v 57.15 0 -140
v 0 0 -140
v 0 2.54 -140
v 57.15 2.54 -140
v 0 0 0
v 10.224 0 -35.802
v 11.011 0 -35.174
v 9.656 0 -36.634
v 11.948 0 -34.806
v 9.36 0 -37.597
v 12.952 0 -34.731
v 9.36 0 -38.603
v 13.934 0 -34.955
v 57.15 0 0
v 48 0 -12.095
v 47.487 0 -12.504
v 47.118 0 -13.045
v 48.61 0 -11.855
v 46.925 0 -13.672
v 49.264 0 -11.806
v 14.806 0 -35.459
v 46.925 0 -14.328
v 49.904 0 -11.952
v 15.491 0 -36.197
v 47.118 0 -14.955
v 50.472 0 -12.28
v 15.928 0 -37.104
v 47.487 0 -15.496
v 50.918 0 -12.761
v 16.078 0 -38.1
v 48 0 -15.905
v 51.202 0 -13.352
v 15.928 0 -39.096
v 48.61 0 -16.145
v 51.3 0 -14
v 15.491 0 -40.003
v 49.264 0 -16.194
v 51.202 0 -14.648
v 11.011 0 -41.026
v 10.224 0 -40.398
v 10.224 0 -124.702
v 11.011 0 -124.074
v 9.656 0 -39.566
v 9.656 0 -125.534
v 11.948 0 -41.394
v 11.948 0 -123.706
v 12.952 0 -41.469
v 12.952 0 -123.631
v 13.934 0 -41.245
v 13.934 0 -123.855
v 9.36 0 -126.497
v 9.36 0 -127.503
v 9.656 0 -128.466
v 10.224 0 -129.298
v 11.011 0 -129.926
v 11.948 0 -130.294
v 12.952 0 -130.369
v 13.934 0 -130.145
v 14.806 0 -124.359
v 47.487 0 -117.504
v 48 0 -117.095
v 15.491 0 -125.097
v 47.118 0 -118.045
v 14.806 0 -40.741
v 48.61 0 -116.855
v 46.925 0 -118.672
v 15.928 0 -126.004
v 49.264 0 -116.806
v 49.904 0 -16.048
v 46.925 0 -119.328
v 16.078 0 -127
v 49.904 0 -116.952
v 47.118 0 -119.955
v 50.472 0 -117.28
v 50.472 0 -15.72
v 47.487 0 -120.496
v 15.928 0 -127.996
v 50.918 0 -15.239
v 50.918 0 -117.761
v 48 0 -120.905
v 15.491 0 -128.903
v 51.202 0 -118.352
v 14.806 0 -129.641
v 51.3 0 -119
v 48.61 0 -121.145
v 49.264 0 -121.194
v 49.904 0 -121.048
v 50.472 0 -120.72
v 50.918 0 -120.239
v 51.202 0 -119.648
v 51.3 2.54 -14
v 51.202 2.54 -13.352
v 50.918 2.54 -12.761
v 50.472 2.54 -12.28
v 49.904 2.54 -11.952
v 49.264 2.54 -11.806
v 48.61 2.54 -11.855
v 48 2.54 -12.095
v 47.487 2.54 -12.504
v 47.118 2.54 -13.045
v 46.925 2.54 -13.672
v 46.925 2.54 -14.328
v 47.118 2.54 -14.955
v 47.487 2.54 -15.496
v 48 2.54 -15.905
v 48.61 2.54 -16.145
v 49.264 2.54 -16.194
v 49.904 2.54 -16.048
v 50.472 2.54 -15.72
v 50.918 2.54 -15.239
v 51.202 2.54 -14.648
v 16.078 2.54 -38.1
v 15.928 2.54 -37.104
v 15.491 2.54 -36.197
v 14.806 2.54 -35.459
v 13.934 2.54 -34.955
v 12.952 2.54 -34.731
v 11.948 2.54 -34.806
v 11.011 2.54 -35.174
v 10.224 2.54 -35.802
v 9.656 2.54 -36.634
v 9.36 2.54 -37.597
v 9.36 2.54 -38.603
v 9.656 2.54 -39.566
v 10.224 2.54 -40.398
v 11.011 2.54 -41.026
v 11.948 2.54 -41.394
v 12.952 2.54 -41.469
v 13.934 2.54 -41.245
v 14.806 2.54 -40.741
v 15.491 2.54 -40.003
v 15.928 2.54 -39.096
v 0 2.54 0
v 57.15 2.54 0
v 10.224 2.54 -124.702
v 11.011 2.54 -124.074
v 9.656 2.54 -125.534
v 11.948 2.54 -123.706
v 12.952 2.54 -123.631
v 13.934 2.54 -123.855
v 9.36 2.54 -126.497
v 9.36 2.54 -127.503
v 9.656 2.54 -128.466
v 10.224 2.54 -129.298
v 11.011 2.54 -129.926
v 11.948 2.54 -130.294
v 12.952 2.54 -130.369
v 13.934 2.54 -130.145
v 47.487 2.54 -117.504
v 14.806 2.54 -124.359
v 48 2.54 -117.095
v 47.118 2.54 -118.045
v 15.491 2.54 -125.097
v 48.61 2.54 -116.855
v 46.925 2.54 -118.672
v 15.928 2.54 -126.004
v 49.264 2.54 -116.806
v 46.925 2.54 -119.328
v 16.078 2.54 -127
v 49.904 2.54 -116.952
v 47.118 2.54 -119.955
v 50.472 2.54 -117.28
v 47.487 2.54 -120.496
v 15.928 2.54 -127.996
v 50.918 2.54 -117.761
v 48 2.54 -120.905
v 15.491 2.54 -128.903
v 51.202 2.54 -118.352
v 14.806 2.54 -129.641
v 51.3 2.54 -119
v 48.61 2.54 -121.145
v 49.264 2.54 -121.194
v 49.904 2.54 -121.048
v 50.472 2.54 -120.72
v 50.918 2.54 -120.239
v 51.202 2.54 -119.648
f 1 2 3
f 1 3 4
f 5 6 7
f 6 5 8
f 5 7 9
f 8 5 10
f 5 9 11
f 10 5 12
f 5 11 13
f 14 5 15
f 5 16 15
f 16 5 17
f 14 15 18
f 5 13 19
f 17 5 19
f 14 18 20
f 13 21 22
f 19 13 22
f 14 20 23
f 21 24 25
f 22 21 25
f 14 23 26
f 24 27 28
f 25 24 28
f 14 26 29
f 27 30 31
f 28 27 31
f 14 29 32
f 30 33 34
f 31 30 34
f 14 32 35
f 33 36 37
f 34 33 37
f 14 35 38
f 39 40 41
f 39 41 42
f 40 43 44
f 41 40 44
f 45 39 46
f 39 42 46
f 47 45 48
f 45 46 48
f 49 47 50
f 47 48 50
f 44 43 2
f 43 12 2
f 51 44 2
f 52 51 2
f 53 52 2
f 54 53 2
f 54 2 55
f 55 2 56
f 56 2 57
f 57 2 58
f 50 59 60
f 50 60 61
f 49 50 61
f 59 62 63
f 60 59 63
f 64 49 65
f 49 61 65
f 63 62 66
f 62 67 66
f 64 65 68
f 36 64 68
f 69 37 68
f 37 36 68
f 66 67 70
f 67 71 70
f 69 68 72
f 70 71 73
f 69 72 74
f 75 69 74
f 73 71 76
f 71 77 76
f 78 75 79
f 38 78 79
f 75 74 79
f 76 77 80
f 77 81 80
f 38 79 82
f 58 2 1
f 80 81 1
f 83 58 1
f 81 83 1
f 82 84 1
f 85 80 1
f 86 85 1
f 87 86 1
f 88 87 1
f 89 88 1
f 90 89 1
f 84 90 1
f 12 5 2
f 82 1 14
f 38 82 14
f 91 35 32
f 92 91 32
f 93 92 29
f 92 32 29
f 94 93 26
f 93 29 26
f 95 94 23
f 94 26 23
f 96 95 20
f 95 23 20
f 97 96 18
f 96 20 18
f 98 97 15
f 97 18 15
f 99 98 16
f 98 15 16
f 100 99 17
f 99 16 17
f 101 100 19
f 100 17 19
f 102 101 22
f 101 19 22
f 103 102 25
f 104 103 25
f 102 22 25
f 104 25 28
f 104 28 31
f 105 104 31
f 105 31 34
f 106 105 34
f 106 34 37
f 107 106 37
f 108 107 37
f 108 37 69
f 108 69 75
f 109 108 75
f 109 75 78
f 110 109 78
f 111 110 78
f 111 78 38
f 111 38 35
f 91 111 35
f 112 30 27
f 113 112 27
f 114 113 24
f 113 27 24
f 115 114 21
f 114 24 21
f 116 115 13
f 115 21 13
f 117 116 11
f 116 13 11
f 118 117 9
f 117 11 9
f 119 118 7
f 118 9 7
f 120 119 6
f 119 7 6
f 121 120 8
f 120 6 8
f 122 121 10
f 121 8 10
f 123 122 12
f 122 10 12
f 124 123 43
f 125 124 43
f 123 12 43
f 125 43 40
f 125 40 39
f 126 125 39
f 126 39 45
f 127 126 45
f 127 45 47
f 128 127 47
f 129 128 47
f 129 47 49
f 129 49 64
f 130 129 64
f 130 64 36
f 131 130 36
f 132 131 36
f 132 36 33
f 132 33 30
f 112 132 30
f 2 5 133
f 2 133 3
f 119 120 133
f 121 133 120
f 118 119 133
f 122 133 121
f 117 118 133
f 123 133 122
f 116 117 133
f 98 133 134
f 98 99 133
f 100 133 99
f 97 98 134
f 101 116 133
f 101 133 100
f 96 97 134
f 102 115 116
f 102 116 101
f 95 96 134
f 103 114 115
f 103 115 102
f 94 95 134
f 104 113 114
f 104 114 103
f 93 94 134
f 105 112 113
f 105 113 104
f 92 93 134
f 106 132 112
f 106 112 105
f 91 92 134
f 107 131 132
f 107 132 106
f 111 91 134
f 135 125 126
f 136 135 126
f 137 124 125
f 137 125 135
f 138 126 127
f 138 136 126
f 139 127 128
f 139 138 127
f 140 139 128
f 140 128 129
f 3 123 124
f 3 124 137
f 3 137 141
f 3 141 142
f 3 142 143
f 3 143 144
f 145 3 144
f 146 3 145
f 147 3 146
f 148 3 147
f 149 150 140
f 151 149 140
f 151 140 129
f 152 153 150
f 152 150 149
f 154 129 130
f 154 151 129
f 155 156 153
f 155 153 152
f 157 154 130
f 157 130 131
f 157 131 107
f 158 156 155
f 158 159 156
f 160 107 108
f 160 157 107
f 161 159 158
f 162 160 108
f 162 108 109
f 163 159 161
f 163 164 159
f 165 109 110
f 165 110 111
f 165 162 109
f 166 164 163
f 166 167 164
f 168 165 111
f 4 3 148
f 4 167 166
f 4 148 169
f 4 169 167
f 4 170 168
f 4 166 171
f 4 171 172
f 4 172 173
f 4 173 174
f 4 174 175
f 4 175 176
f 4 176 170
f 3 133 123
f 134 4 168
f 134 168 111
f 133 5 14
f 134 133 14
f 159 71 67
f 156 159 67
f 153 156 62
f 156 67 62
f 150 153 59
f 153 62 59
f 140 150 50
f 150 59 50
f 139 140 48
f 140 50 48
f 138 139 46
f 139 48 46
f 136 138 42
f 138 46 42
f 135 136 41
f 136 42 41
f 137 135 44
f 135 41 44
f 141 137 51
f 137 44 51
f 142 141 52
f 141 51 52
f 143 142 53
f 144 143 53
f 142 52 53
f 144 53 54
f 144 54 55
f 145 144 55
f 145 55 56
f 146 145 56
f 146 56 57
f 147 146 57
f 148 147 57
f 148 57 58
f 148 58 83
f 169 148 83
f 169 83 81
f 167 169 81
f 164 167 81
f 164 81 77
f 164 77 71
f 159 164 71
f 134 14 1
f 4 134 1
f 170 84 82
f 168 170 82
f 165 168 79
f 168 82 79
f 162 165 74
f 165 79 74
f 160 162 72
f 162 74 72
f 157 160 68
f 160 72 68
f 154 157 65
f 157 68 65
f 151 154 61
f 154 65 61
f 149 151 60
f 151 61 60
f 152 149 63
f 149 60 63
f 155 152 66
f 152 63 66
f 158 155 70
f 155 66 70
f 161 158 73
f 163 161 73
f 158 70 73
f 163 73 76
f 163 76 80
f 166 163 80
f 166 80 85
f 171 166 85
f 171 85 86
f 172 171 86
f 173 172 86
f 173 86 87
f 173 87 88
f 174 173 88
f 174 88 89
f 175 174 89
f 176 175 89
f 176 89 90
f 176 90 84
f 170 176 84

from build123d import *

# Parameters (mm, degrees)
SKETCH1_W               = 57.15
SKETCH1_H               = 140
BOSS_EXTRUDE1_DEPTH     = 2.54
SKETCH2_R               = 2.2
CUT_EXTRUDE1_DEPTH      = 3.54
SKETCH3_R               = 3.3782
CUT_EXTRUDE2_DEPTH      = 1
CUT_EXTRUDE2_DEPTH_BACK = 3.54


with BuildPart() as part:
    # Sketch1 → Boss-Extrude1 (new body)
    with BuildSketch(Plane(origin=(0, 0, 0), x_dir=(1, 0, 0), z_dir=(0, 1, 0))):
        with Locations((28.575, 70)):
            Rectangle(SKETCH1_W, SKETCH1_H)
    extrude(amount=BOSS_EXTRUDE1_DEPTH)

    # Sketch2 → Cut-Extrude1 (cut, through all)
    with BuildSketch(Plane.XZ):
        with Locations((49.1, -119)):
            Circle(SKETCH2_R)
        with Locations((49.1, -14)):
            Circle(SKETCH2_R)
    extrude(amount=-CUT_EXTRUDE1_DEPTH, mode=Mode.SUBTRACT)

    # Sketch3 → Cut-Extrude2 (cut, two sides)
    with BuildSketch(Plane.XZ) as cut_extrude2_sk:
        with Locations((12.7, -127)):
            Circle(SKETCH3_R)
        with Locations((12.7, -38.1)):
            Circle(SKETCH3_R)
    extrude(amount=CUT_EXTRUDE2_DEPTH, mode=Mode.SUBTRACT)
    extrude(cut_extrude2_sk.sketch, amount=-CUT_EXTRUDE2_DEPTH_BACK, mode=Mode.SUBTRACT)


solid = part.part
